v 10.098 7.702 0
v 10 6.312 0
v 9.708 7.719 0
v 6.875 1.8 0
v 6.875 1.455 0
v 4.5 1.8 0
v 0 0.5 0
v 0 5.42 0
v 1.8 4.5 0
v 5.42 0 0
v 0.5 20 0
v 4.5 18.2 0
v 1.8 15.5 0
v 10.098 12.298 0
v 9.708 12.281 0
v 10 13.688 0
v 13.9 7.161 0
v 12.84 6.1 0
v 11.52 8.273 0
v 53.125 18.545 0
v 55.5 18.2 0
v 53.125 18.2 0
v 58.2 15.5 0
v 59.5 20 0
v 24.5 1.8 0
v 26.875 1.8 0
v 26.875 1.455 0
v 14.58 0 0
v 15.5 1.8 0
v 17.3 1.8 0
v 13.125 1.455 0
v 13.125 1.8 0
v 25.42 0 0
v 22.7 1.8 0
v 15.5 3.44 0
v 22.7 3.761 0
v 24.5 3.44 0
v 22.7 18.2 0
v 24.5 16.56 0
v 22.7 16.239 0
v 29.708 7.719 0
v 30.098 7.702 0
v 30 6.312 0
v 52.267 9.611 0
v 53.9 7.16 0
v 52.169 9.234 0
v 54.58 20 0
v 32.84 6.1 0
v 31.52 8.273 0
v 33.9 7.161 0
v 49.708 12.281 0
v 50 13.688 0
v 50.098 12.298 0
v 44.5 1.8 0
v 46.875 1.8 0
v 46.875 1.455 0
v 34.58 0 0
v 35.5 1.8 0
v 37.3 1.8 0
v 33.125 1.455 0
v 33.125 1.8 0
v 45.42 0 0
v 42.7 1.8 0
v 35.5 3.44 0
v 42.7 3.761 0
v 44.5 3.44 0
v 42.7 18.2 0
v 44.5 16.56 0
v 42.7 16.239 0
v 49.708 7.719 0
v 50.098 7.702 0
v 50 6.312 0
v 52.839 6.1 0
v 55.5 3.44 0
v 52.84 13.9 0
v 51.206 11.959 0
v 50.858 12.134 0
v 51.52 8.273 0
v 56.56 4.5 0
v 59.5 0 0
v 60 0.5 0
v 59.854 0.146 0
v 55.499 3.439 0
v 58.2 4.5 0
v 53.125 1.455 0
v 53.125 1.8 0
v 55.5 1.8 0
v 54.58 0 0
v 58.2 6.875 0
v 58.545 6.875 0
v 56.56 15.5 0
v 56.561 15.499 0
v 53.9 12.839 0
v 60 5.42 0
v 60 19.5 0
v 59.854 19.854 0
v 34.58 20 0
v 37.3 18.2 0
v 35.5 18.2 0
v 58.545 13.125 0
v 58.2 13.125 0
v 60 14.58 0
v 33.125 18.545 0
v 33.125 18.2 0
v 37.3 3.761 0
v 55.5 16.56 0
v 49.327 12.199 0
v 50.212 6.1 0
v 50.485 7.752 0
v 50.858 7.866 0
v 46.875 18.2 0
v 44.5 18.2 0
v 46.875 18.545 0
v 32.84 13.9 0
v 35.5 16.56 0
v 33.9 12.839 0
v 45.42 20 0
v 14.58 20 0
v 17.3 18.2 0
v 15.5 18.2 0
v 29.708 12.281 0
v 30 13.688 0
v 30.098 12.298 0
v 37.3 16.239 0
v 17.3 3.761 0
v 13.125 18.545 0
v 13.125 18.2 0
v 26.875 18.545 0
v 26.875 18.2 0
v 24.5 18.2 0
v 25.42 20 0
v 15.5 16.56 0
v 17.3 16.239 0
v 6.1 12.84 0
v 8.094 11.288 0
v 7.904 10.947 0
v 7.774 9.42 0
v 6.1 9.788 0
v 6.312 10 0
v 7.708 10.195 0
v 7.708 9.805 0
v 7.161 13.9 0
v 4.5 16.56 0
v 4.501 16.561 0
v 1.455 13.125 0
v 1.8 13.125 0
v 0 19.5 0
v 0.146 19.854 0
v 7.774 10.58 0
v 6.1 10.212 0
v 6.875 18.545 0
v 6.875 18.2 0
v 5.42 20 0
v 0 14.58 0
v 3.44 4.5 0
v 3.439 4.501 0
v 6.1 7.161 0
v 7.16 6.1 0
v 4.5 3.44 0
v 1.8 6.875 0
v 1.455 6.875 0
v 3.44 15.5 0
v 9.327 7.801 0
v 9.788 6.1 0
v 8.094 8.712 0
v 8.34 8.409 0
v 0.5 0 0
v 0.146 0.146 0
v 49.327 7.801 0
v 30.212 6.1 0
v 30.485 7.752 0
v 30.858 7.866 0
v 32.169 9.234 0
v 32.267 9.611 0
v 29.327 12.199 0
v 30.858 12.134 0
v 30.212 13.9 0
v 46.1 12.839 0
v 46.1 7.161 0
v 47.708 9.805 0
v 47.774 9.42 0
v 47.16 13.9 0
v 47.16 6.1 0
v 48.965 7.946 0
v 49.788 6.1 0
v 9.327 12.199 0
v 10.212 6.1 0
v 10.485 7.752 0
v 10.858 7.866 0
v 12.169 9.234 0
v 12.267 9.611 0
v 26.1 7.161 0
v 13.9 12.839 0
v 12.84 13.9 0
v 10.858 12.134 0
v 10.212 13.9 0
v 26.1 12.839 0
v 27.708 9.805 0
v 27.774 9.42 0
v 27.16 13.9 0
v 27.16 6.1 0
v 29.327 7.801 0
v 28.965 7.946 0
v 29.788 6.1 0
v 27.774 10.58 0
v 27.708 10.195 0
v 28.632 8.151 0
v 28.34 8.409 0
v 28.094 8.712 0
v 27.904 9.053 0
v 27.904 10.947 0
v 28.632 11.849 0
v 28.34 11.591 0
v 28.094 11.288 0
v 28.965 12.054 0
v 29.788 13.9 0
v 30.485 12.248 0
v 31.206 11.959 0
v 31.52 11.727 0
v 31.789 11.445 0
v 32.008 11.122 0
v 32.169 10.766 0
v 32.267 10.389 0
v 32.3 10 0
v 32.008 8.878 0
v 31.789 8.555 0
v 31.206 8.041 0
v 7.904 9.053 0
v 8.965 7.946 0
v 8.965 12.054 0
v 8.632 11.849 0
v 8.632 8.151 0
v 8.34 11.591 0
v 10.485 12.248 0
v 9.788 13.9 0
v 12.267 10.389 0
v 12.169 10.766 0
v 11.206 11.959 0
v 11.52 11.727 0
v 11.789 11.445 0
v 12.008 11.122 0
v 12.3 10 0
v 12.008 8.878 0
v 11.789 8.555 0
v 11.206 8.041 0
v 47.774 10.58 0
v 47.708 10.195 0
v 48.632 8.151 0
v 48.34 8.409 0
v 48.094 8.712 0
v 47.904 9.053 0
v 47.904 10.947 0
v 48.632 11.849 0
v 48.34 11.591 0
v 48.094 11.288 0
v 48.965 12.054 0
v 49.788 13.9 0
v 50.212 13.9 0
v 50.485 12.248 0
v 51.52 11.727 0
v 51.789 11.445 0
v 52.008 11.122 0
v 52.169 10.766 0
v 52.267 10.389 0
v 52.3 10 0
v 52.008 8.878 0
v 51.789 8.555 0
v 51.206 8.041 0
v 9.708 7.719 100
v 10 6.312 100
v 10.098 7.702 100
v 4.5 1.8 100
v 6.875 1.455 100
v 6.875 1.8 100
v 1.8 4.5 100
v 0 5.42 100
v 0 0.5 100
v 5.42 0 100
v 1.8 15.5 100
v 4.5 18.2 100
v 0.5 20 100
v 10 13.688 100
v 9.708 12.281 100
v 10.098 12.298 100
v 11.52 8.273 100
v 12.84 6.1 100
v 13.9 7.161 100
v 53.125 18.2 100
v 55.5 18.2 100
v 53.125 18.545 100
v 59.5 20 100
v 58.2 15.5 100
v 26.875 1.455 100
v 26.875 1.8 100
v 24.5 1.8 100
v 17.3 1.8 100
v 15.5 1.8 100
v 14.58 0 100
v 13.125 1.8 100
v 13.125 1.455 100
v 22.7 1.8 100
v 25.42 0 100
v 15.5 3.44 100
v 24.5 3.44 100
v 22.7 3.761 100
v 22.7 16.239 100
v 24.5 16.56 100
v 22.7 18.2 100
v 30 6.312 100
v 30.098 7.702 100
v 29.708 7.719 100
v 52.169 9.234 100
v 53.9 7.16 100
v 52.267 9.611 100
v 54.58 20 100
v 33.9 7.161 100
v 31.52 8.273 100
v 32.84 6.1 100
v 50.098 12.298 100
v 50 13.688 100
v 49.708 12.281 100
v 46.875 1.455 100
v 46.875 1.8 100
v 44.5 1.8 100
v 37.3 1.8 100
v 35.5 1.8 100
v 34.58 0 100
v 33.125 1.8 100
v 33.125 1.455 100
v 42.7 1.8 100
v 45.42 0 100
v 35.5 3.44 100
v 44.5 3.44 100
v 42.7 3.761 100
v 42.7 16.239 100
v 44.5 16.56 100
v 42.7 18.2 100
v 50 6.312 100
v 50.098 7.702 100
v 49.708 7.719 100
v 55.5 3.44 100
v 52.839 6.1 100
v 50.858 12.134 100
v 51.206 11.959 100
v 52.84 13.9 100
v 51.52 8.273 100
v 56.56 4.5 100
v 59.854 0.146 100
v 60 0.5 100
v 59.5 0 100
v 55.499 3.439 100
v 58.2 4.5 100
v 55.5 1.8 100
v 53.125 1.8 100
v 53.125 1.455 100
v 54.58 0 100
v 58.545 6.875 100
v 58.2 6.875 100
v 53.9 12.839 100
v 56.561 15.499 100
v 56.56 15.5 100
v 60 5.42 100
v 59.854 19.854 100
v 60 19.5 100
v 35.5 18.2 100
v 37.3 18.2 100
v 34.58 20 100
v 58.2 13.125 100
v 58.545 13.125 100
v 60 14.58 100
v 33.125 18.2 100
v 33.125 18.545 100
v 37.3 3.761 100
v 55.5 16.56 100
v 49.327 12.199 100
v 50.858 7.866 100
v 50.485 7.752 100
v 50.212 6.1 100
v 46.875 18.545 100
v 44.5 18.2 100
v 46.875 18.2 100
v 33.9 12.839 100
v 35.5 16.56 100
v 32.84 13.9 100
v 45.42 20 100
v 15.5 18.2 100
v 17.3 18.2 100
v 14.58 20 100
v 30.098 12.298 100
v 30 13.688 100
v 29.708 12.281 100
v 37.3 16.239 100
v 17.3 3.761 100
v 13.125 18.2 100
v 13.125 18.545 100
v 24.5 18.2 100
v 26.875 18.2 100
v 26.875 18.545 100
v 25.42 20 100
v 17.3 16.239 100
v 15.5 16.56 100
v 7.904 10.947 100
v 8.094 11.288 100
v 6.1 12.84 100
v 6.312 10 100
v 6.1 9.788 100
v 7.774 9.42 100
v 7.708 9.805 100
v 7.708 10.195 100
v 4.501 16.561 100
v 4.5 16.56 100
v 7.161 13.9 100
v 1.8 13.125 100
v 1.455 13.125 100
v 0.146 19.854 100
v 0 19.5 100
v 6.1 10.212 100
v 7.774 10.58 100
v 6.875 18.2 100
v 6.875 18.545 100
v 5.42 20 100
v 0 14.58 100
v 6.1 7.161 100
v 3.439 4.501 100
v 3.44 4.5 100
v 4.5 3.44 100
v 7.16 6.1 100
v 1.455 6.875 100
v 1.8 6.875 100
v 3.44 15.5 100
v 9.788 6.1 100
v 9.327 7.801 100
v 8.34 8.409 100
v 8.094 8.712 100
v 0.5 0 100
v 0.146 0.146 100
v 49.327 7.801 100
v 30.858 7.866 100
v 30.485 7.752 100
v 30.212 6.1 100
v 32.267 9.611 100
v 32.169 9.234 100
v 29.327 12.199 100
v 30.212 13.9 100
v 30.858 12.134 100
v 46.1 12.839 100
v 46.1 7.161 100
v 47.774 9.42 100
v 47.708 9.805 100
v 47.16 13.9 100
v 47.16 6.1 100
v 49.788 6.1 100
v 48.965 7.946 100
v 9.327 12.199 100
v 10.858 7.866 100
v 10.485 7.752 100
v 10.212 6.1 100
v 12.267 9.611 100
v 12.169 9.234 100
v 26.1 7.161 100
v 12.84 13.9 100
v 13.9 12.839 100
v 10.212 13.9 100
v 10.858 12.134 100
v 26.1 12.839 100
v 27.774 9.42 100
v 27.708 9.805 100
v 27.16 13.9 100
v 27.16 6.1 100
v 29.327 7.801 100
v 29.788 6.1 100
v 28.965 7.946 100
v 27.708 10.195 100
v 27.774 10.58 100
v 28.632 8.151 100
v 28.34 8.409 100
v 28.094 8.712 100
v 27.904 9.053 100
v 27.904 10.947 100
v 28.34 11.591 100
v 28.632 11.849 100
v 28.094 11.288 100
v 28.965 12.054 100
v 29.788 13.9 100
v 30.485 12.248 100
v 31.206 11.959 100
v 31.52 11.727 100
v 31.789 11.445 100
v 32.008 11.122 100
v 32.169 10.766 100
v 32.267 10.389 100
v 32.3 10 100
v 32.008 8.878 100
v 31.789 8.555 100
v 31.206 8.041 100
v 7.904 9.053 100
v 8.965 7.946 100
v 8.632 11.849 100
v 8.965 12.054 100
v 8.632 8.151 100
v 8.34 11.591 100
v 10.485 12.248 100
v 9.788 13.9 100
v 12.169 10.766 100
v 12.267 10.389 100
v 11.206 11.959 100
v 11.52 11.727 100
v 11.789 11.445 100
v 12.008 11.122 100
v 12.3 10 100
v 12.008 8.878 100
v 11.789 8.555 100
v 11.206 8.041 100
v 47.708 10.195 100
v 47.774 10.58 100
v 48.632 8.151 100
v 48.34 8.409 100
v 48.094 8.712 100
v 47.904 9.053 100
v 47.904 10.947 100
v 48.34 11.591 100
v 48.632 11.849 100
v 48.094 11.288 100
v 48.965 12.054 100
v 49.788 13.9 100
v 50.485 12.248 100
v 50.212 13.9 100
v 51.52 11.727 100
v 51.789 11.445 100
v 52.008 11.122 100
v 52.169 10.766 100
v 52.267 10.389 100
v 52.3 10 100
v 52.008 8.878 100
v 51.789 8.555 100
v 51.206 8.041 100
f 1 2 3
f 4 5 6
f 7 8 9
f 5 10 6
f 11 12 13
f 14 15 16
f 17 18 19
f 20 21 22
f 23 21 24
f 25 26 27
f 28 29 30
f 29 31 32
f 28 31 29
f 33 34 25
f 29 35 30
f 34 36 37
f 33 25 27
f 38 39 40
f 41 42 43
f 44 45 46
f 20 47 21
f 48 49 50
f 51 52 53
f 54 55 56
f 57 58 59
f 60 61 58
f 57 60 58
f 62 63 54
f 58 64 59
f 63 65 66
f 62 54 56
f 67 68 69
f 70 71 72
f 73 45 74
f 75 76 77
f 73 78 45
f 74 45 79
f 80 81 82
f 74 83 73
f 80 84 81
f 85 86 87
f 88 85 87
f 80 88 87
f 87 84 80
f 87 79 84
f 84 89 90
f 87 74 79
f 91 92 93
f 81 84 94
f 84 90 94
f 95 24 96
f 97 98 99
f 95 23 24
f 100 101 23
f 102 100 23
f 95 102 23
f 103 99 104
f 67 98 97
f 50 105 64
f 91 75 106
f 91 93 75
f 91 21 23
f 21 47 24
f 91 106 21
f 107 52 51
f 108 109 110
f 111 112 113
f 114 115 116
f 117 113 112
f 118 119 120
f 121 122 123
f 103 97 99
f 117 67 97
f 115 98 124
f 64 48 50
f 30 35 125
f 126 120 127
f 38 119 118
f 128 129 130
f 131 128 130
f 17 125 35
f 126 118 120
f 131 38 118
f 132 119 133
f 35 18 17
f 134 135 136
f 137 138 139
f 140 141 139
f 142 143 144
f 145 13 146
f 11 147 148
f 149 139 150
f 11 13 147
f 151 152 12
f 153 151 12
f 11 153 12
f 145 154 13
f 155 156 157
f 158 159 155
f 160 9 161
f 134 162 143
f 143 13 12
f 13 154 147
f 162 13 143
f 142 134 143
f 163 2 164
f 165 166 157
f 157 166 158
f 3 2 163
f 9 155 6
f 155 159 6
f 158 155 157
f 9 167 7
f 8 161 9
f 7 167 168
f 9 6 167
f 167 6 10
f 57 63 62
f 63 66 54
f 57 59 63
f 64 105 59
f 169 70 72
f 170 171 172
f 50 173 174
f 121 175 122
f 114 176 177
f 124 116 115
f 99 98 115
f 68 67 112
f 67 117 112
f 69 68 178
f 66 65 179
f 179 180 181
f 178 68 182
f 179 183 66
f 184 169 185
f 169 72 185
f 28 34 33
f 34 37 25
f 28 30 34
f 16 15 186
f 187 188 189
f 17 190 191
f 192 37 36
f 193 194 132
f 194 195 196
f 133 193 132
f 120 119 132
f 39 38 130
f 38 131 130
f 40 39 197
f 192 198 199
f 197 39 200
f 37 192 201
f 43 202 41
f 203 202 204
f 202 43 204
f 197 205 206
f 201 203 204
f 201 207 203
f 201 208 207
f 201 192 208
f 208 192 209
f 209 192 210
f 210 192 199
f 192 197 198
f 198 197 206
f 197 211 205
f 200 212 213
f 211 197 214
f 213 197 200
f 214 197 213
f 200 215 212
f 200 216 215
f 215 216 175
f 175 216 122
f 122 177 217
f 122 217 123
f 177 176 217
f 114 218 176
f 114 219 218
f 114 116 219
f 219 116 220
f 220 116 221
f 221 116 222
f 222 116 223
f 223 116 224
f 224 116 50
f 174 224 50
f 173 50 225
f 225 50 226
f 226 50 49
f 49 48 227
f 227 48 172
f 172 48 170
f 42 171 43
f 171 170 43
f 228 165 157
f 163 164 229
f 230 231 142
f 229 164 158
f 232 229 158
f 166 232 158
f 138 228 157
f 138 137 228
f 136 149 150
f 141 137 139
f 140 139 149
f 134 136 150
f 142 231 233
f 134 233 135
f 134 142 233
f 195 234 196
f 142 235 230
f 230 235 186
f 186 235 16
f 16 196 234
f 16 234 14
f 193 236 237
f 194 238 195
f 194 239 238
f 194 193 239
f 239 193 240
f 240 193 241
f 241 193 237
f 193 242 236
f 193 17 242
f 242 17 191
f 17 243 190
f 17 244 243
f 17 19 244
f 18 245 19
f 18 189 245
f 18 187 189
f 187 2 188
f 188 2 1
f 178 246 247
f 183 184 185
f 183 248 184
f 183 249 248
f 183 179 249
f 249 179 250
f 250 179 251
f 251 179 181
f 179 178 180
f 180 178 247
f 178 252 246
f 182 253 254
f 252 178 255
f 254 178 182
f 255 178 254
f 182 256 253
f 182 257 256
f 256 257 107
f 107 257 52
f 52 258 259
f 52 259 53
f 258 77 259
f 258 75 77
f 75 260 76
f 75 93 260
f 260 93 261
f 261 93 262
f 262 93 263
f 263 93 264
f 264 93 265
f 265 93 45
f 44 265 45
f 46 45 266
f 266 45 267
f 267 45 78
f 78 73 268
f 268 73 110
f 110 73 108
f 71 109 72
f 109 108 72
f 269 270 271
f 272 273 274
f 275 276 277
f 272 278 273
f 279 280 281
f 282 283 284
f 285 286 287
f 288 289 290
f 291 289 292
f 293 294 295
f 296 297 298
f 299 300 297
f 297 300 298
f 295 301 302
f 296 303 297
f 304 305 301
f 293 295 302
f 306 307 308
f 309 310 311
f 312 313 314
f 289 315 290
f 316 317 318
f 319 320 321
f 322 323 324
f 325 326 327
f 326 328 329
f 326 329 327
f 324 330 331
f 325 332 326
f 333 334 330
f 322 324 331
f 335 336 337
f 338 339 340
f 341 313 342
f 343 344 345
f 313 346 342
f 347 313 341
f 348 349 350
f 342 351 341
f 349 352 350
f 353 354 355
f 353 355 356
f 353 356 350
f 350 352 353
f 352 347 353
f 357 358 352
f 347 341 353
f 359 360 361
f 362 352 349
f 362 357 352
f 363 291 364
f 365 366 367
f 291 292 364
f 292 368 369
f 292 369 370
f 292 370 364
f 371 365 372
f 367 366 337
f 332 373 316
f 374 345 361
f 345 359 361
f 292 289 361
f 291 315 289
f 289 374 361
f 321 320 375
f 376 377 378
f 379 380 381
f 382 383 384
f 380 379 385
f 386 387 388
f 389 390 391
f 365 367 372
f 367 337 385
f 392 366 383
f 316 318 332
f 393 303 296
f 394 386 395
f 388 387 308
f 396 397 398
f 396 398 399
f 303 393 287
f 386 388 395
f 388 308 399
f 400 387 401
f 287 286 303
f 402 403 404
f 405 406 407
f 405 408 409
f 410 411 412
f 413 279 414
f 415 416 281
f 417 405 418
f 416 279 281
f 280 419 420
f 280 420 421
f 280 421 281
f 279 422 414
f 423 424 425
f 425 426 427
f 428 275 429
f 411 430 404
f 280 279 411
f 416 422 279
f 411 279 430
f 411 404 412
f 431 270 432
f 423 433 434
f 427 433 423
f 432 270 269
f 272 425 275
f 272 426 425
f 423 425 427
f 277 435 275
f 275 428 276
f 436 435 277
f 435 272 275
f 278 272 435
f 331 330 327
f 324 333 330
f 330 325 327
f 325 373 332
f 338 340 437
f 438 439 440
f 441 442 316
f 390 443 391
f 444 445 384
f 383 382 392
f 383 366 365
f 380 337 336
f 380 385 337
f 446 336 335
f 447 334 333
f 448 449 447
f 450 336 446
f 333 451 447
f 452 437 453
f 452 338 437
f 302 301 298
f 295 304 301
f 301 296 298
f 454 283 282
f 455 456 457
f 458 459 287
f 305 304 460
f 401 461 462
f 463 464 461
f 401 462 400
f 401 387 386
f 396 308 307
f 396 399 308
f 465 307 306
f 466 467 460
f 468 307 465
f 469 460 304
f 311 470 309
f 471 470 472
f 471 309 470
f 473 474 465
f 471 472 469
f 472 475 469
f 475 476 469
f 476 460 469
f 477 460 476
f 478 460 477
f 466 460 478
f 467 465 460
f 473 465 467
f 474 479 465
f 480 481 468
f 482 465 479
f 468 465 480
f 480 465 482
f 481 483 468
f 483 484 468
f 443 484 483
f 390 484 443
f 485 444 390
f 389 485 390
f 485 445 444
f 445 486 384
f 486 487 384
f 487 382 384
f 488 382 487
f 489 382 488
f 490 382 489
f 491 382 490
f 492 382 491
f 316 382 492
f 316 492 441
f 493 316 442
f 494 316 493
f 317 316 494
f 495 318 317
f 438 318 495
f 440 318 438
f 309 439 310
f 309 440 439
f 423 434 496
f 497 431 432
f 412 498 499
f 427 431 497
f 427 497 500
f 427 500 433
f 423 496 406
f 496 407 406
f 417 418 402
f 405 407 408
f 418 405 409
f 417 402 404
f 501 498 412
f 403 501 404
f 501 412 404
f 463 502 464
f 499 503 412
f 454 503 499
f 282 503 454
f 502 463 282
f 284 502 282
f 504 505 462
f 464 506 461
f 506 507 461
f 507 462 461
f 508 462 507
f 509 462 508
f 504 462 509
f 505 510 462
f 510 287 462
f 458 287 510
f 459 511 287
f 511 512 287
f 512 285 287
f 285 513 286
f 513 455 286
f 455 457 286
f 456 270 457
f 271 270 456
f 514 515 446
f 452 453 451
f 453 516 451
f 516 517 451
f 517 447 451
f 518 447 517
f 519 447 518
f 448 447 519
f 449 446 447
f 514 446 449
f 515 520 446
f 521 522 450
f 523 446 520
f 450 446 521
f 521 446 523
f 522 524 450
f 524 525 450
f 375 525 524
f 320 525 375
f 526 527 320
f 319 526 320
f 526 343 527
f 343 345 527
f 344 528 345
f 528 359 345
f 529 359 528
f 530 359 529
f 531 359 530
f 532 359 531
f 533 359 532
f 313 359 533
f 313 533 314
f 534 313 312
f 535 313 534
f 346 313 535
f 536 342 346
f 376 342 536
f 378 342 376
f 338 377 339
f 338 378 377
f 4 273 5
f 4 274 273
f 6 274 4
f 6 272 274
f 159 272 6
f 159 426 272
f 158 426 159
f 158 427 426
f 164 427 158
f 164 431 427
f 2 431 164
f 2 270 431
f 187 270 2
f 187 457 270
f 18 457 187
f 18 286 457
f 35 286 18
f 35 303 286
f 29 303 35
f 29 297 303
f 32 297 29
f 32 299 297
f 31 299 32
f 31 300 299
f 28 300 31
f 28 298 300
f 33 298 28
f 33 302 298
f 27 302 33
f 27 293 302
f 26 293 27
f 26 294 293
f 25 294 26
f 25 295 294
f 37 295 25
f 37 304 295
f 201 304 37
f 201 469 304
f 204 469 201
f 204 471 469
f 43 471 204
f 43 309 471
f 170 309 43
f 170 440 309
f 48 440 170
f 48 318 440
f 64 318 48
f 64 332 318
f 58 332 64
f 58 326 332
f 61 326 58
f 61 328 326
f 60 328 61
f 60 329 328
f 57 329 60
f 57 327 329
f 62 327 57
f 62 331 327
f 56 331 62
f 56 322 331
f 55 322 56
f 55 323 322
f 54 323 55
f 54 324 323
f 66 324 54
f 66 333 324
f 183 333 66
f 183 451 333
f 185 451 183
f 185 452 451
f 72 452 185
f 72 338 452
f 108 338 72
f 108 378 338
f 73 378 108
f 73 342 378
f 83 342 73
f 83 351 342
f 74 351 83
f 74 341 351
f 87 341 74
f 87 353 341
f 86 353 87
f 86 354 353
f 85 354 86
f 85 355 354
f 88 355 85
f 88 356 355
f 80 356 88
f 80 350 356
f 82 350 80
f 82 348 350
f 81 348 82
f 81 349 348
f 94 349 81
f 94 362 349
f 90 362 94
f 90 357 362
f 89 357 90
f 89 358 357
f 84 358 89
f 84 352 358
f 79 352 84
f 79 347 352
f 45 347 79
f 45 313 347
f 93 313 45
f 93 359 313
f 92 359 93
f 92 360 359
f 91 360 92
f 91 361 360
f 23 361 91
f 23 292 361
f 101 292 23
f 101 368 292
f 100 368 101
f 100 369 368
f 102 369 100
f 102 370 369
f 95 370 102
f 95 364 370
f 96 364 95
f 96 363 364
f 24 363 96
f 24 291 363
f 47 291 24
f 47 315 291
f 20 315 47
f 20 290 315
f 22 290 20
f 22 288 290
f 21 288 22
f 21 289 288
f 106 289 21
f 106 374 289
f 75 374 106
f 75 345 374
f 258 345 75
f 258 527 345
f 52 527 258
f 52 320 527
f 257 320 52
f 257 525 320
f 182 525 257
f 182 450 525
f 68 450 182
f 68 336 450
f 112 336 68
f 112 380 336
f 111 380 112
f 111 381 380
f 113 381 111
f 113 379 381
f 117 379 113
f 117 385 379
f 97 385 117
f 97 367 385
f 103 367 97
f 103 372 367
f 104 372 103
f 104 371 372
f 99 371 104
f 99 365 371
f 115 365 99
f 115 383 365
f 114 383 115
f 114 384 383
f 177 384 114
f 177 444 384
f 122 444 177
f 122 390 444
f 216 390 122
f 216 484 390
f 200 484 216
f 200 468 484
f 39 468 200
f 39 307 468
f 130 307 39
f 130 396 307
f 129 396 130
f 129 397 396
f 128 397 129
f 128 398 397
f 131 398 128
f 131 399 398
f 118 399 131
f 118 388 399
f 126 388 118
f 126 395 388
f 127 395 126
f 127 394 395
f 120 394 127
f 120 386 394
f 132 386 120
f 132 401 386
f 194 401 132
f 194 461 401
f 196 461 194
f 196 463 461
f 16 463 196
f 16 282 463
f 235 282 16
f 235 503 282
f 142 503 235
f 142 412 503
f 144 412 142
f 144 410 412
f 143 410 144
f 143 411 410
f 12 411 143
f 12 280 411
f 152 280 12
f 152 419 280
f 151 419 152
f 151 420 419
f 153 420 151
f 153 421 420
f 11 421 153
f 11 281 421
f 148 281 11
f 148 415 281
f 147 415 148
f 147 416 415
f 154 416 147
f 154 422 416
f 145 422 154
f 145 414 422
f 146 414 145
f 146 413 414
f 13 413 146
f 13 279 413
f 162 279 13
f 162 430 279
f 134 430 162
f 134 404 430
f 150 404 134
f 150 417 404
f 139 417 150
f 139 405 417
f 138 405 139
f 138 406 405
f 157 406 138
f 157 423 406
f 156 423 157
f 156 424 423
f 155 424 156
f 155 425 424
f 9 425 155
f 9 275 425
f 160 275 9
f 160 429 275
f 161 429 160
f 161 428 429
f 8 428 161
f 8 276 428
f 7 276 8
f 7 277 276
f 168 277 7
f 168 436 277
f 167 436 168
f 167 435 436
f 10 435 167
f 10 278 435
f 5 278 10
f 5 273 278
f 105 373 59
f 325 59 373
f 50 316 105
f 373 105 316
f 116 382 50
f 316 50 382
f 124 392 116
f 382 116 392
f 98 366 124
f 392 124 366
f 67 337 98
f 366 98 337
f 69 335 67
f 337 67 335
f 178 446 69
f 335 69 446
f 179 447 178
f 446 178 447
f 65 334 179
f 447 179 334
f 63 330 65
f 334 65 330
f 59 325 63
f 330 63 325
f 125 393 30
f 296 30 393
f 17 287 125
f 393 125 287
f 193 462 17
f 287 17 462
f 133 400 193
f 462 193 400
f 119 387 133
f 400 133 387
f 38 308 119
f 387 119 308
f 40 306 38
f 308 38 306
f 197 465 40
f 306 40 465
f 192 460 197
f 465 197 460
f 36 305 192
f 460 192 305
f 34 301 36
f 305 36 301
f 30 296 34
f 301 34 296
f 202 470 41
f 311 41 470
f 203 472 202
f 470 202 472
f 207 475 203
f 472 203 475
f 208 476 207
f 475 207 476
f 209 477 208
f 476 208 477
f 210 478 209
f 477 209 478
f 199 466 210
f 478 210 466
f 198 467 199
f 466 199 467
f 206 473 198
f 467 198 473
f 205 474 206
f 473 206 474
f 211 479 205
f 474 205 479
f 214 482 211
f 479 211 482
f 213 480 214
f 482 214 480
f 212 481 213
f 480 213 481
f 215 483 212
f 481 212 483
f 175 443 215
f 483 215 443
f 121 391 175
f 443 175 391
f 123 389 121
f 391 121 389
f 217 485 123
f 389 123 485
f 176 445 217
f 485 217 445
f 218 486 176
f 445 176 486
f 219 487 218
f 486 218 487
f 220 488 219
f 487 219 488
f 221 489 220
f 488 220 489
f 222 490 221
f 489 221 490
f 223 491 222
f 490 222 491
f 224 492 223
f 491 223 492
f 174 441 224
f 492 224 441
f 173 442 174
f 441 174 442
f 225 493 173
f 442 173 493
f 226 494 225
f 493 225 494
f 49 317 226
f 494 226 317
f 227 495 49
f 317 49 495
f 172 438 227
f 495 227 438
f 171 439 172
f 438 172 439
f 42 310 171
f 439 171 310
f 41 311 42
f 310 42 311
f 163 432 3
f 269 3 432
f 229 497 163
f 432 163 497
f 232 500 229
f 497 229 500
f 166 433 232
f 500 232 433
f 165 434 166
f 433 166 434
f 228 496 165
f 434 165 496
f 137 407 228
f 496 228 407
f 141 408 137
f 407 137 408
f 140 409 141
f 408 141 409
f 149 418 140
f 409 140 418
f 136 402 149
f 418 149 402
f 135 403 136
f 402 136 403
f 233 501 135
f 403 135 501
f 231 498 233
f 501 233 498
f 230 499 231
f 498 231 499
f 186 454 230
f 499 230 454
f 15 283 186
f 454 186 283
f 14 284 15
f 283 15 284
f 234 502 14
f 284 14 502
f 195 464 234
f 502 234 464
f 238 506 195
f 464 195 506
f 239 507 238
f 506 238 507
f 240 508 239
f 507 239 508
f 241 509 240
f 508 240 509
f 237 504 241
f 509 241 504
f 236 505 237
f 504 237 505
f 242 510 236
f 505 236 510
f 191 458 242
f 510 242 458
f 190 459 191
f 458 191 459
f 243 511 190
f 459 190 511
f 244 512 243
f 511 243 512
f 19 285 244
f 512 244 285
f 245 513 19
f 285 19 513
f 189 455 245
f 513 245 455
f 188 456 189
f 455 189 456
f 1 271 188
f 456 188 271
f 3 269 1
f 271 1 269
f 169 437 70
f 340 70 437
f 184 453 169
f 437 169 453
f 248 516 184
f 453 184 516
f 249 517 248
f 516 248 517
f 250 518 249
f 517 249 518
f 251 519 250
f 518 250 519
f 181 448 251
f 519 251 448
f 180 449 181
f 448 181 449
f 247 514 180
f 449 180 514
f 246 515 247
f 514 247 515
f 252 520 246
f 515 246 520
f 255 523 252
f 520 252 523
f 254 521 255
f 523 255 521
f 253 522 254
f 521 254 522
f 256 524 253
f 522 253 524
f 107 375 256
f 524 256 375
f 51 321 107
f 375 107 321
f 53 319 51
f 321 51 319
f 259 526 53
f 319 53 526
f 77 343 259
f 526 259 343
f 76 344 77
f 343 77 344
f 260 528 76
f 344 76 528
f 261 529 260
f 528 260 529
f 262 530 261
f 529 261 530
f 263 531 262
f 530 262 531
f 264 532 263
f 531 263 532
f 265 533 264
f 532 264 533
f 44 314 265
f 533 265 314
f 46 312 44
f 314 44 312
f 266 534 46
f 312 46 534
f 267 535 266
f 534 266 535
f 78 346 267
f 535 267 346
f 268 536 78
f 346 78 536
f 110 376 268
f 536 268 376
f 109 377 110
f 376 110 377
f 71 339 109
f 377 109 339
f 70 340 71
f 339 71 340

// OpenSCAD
$fa = 1.0;
$fs = 0.4;

module center(l=1,r=1,t=1,b=1){
    difference(){
        translate([-3.9,-3.9,0]) square(7.8);
        circle(r=2.3);
        if(t==1) {translate([0,3.688,0]) rotate([0,0,45]) square(0.3);}
        if(b==1) {translate([0,-4.112,0]) rotate([0,0,45]) square(0.3);}
        if(r==1) {translate([3.9,-0.212,0]) rotate([0,0,45]) square(0.3);}
        if(l==1) {translate([-3.9,-0.212,0]) rotate([0,0,45]) square(0.3);}
   }
}
 
module corner(){
    translate([0.5,0.5,0]) circle(r=0.5);
    hull(){
        translate([0.5,0,0]) square([4.92,1.8]);
        translate([0.5,1.455,0]) square([6.375,0.345]);
    }
    hull(){
        translate([0,0.5,0]) square([1.8,4.92]);
        translate([1.455,0.5,0]) square([0.345,6.375]);
    }
    translate([1.8,1.8,0]) square(2.7);
    translate([4.5,3.44,0]) rotate([0,0,45]) square([3.763,1.5]);
}

module mids(){
    hull(){
        translate([-5.42,0,0]) square([10.84,1.8]);
        translate([-6.875,1.455,0]) square([13.75,0.345]);
    }
    translate([2.7,1.8,0]) square([1.8,1.961]);
    translate([-4.5,1.8,0]) square([1.8,1.961]);
    translate([2.7,3.761,0]) rotate([0,0,-45]) square([1.5,4.808]);
    translate([-2.7,3.761,0]) rotate([0,0,45]) translate([-1.5,0,0]) square([1.5,4.808]);
}
 
module vslot2060(){
   corner();
   translate([60,0,0]) rotate([0,0,90]) corner();
   translate([60,20,0]) rotate([0,0,180]) corner();
   translate([0,20,0]) rotate([0,0,270]) corner();
   translate([20,0,0]) mids();
   translate([20,20]) rotate([0,0,180]) mids();
   translate([40,0,0]) mids();
   translate([40,20]) rotate([0,0,180]) mids();
   translate([10,10,0]) center(l=1,r=0,t=1,b=1);
   translate([30,10,0]) center(l=0,r=0,t=1,b=1);
   translate([50,10,0]) center(l=0,r=0,t=1,b=1);
}
 
 // linear extrude height is desired length of v-slot
 color("slategray"){
     linear_extrude(height=100) vslot2060();
 }
